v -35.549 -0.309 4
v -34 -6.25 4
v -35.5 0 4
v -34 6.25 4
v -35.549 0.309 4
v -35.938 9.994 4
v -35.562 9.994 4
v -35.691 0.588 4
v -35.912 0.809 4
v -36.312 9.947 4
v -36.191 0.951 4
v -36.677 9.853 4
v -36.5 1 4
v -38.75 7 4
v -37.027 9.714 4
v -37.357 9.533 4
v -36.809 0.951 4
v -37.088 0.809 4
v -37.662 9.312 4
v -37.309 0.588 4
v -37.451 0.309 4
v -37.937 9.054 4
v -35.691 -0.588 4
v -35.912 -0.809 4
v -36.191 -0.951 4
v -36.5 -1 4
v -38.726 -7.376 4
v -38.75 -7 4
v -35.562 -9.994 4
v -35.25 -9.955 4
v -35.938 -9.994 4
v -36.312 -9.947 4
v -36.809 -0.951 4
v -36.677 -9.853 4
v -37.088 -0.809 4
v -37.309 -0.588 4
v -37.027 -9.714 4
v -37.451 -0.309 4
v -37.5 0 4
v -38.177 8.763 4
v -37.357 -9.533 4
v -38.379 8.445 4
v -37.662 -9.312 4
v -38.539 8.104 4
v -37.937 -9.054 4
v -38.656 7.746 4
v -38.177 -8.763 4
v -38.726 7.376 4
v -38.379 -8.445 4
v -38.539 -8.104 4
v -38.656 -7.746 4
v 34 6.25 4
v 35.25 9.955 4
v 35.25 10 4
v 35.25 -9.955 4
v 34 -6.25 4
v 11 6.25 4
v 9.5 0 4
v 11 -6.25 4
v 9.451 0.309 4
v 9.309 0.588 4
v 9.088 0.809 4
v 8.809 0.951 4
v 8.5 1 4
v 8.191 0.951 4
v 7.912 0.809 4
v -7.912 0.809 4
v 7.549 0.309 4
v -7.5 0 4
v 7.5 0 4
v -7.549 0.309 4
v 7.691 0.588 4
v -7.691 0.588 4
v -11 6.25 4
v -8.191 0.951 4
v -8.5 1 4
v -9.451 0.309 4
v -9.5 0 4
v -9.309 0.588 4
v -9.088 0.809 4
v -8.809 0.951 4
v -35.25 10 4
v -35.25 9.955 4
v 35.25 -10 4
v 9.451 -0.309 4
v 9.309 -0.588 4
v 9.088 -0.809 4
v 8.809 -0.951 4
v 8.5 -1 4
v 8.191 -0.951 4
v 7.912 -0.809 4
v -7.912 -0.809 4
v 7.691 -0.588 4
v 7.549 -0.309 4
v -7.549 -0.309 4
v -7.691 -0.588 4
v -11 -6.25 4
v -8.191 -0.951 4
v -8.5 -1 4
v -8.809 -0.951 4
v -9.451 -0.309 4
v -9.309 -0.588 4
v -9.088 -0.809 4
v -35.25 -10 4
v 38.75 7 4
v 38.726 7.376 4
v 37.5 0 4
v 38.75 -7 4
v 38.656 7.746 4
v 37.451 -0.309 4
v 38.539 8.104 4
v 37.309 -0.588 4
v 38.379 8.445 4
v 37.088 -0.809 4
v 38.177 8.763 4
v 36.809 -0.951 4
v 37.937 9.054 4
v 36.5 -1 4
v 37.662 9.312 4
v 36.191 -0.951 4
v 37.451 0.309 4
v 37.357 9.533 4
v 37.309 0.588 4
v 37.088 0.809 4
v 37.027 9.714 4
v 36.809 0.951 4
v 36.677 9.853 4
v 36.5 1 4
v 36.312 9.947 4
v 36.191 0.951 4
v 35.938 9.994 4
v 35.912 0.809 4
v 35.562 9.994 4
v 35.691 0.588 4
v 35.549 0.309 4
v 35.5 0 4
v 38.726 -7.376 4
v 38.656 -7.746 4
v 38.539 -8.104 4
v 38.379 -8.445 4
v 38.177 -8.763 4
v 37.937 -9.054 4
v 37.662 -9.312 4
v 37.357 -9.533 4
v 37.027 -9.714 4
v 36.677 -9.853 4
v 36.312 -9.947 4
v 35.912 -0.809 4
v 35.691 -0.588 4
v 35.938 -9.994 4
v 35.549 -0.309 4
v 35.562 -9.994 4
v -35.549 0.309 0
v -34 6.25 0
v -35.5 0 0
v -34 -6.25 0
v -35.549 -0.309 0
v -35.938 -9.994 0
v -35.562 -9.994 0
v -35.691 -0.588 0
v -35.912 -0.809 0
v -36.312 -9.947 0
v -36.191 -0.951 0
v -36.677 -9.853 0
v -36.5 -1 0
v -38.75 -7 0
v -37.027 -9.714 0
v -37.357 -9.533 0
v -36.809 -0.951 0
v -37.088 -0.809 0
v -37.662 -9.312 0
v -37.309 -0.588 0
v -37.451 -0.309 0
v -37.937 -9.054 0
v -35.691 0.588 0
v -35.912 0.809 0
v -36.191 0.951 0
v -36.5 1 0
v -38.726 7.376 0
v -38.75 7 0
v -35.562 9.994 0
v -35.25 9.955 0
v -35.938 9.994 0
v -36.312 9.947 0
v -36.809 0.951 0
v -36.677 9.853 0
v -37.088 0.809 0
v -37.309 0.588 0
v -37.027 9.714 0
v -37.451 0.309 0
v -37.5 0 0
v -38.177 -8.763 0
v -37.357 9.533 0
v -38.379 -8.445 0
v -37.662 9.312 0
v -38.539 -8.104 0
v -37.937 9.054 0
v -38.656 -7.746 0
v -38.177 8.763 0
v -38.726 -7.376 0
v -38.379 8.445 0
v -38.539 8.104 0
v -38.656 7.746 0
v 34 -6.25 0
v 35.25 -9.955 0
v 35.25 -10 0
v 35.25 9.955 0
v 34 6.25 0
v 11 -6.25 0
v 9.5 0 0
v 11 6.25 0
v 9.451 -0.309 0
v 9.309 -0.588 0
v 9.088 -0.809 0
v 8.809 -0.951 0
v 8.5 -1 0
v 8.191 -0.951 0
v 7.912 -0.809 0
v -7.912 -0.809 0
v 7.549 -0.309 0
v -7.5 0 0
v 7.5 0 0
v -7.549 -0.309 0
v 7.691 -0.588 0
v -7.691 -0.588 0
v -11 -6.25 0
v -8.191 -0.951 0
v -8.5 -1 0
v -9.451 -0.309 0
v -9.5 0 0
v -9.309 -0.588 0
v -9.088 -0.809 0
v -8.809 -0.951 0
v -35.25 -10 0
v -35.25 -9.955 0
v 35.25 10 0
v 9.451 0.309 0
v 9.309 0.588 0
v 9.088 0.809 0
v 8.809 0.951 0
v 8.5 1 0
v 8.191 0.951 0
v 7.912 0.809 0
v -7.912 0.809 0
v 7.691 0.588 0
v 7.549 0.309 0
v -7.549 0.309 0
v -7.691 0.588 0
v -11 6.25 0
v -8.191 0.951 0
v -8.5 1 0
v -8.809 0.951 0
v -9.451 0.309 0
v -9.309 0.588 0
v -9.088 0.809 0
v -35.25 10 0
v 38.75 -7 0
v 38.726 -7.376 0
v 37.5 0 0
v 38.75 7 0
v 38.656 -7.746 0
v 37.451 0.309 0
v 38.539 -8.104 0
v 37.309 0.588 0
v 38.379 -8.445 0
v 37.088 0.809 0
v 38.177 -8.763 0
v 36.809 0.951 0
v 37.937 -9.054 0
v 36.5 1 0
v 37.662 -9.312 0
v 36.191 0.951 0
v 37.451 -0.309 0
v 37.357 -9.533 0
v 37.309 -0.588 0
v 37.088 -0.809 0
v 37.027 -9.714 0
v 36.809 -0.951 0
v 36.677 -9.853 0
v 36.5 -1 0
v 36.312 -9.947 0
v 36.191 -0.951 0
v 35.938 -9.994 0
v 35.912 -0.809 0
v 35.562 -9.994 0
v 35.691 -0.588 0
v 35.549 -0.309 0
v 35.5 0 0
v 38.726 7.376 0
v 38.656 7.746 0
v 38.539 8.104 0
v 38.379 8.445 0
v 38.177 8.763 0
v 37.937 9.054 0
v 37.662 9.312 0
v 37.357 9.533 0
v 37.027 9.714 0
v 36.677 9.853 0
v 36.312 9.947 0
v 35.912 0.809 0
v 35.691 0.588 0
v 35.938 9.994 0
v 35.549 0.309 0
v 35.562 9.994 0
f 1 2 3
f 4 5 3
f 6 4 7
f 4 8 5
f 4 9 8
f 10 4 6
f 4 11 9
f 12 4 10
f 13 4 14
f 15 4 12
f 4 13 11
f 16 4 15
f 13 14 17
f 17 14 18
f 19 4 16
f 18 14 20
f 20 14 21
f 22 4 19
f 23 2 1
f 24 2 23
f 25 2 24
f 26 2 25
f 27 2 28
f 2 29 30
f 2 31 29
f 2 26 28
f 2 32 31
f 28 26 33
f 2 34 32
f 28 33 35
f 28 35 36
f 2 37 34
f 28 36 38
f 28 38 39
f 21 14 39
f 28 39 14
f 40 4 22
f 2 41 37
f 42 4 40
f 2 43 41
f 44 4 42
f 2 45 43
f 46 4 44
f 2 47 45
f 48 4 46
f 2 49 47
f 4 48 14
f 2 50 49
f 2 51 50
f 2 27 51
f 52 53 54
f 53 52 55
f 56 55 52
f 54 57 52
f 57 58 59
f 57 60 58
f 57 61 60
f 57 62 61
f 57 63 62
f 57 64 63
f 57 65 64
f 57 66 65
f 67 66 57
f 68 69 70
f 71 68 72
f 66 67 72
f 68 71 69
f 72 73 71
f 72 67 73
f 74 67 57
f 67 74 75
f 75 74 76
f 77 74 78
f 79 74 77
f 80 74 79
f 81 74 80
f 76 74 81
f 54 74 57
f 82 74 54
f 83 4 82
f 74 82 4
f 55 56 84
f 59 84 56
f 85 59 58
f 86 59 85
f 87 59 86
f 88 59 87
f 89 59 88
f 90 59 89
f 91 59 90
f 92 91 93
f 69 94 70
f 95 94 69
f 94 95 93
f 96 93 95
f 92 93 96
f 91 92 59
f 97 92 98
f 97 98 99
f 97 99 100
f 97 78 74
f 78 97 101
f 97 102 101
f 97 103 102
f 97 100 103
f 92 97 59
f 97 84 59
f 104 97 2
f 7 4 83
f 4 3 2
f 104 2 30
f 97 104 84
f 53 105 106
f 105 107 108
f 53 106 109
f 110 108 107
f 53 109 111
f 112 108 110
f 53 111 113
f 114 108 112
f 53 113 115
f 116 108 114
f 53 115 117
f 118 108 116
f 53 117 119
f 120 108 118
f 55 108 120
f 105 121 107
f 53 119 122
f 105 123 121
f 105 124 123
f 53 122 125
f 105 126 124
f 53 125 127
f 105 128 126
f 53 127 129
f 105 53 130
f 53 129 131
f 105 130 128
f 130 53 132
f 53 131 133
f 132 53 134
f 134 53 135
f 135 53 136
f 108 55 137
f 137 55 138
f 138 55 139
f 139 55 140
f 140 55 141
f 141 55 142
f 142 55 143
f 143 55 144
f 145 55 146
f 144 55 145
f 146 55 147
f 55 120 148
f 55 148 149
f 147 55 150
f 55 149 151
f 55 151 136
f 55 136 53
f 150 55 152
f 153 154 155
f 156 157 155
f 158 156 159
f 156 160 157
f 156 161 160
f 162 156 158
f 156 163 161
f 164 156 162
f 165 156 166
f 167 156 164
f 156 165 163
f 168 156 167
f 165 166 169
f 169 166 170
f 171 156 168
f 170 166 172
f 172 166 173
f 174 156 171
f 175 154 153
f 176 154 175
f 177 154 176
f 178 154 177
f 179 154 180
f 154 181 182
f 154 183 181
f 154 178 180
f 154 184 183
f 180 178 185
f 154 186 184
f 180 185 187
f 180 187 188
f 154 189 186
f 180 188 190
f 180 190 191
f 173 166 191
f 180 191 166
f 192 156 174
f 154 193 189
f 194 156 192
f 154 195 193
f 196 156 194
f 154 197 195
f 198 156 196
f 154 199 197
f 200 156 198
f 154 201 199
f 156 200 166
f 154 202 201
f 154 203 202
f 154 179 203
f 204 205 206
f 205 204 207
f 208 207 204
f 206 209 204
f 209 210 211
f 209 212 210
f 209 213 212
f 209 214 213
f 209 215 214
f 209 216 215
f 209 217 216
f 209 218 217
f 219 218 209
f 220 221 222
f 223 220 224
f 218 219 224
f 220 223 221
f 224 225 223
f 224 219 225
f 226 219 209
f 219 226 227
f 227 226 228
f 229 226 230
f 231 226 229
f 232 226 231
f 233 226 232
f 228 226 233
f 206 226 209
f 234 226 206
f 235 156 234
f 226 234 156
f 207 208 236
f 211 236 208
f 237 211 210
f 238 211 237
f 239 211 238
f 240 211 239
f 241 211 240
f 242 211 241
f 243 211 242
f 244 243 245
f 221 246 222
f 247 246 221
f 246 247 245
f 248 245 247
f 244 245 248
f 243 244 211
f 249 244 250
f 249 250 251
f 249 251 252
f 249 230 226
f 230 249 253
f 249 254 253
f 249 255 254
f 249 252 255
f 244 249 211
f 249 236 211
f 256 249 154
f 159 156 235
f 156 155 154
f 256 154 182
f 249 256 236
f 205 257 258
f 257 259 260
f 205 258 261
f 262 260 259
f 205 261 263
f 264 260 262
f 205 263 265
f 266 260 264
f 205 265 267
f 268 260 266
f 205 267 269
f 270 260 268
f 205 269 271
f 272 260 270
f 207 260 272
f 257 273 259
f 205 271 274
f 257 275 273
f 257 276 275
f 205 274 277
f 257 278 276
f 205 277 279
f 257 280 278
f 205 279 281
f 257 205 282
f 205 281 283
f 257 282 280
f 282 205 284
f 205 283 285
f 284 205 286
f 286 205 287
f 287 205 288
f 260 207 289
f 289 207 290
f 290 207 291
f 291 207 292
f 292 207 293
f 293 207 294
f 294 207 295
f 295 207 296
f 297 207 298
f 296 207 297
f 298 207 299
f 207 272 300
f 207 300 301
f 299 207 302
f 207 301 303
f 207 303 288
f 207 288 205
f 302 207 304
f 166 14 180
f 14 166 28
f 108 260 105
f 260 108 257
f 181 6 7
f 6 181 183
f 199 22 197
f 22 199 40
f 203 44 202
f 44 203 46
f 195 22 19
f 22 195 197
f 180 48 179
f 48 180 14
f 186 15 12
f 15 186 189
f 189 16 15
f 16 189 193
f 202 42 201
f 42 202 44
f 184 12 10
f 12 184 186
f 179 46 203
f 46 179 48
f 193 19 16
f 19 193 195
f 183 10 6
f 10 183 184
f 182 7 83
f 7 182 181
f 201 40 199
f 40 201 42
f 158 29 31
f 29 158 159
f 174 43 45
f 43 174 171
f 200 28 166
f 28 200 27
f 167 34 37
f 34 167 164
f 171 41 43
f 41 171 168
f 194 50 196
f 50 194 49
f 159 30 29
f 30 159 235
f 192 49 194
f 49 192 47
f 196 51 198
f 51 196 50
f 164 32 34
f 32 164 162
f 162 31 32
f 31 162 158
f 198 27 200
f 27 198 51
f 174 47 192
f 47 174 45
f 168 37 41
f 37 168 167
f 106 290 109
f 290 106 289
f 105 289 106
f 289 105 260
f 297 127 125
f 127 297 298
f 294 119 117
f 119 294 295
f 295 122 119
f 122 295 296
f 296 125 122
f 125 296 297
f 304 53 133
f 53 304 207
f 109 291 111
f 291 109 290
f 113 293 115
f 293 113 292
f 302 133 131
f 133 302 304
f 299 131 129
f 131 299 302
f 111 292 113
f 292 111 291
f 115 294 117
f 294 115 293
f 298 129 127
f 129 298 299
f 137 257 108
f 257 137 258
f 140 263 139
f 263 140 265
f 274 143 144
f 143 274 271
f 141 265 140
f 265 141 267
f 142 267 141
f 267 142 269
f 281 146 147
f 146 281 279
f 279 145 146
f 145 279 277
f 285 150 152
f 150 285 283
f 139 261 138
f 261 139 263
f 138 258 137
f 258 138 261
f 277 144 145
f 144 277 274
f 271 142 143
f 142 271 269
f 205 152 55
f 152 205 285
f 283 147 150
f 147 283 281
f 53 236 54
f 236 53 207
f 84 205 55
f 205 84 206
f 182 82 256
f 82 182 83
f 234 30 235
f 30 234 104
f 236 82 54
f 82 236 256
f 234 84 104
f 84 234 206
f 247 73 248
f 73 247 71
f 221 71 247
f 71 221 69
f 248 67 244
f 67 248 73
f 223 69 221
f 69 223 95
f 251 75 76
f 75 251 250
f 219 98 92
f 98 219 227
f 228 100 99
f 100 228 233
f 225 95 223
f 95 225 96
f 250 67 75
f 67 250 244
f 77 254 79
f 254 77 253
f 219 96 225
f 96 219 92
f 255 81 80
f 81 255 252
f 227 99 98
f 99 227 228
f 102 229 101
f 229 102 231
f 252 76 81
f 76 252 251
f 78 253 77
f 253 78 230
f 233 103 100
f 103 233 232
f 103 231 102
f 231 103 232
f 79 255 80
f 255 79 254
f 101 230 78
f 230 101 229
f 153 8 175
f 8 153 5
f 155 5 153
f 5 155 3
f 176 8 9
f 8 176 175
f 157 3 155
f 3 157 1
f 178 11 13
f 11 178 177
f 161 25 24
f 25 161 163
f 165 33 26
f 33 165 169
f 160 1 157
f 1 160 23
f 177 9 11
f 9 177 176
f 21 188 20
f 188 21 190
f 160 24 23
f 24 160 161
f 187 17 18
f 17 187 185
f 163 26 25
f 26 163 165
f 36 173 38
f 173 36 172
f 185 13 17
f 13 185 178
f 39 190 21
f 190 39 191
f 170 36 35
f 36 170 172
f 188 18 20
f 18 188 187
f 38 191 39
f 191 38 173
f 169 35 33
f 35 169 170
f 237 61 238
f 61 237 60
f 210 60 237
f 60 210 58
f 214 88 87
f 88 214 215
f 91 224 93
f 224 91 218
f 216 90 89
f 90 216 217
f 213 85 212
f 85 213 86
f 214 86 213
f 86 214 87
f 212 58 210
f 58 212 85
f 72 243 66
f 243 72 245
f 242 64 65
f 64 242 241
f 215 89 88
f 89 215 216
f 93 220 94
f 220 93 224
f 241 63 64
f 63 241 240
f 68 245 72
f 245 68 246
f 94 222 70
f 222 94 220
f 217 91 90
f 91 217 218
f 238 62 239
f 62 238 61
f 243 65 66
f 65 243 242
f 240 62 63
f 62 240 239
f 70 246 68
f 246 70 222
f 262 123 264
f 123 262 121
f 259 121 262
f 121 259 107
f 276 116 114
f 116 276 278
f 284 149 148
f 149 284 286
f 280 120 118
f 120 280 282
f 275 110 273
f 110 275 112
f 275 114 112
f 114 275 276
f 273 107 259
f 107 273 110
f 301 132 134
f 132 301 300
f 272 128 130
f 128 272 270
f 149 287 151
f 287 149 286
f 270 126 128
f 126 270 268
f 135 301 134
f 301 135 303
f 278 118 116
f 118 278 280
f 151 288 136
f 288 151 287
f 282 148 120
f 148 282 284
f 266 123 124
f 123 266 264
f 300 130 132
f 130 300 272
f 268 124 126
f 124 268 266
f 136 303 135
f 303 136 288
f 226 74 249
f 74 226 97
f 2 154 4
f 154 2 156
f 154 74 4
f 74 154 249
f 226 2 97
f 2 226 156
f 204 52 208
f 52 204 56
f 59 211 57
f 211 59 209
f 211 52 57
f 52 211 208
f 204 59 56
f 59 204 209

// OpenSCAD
// file: hip_dimensions.scad
// making all of these values variables, and calculating values from
// other values where possible, makes it possible to change values and
// have the board automatically adjust to changes. Try changing 'hip_center_space'
// for instance.

hip_height = 4;
hip_width = 20;
hip_end_radius = 3;
screwhole_offset = 2.5;
screwhole_radius = 1;
servo_motor_length = 23;
servo_motor_width = 12.5;

// width of motor controller headers + a little extra
hip_center_space = 12;
length = servo_motor_length * 2 + screwhole_offset * 5 + hip_center_space;
// main file
include <hip_dimensions.scad>;

hip();

module
hip()
{
    difference()
    {
        union()
        {
            // main
            translate([ -length / 2, -hip_width / 2, 0 ])
                cube([ length, hip_width, hip_height ]);

            // outside end edges
            for (i = [
                     [
                         -length / 2 - hip_end_radius - 0.5,
                         -(hip_width / 2 - hip_end_radius),
                         0
                     ],
                     [
                         length / 2 - hip_end_radius + 0.5,
                         -(hip_width / 2 - hip_end_radius),
                         0
                     ]
                 ]) {
                translate(i)
                    cube([ hip_end_radius * 2, hip_width - (hip_end_radius * 2), hip_height ]);
            }

            // rounded corners
            for (i = [
                     [ -length / 2 - 0.5, hip_width / 2 - hip_end_radius, 0 ],
                     [ -length / 2 - 0.5, -(hip_width / 2 - hip_end_radius), 0 ],
                     [ length / 2 + 0.5, hip_width / 2 - hip_end_radius, 0 ],
                     [ length / 2 + 0.5, -(hip_width / 2 - hip_end_radius), 0 ]
                 ]) {
                translate(i) cylinder(r = hip_end_radius, h = hip_height, $fn = 50);
            }
        }

        // because they're cutouts, overspecify height on these

        // servo mount holes
        for (i = [
                 [ -screwhole_offset - hip_center_space / 2, 0, -(hip_height / 2) ],
                 [ -length / 2 - screwhole_offset / 2, 0, -(hip_height / 2) ],
                 [ screwhole_offset + hip_center_space / 2, 0, -(hip_height / 2) ],
                 [ length / 2 + screwhole_offset / 2, 0, -(hip_height / 2) ]
             ]) {
            translate(i)
                cylinder(r = screwhole_radius, h = hip_height + 5, $fn = 20);
        }

        // servo body cutouts
        for (i = [
                 [ -servo_motor_length/2 - hip_center_space / 2 - screwhole_offset*2, 0, hip_height / 2 ],
                 [ servo_motor_length/2 + hip_center_space / 2 + screwhole_offset*2, 0, hip_height / 2 ]
             ]) {
            translate(i)
                cube([ servo_motor_length, servo_motor_width, hip_height + 5 ],
                     center = true);
        }
    }
}
